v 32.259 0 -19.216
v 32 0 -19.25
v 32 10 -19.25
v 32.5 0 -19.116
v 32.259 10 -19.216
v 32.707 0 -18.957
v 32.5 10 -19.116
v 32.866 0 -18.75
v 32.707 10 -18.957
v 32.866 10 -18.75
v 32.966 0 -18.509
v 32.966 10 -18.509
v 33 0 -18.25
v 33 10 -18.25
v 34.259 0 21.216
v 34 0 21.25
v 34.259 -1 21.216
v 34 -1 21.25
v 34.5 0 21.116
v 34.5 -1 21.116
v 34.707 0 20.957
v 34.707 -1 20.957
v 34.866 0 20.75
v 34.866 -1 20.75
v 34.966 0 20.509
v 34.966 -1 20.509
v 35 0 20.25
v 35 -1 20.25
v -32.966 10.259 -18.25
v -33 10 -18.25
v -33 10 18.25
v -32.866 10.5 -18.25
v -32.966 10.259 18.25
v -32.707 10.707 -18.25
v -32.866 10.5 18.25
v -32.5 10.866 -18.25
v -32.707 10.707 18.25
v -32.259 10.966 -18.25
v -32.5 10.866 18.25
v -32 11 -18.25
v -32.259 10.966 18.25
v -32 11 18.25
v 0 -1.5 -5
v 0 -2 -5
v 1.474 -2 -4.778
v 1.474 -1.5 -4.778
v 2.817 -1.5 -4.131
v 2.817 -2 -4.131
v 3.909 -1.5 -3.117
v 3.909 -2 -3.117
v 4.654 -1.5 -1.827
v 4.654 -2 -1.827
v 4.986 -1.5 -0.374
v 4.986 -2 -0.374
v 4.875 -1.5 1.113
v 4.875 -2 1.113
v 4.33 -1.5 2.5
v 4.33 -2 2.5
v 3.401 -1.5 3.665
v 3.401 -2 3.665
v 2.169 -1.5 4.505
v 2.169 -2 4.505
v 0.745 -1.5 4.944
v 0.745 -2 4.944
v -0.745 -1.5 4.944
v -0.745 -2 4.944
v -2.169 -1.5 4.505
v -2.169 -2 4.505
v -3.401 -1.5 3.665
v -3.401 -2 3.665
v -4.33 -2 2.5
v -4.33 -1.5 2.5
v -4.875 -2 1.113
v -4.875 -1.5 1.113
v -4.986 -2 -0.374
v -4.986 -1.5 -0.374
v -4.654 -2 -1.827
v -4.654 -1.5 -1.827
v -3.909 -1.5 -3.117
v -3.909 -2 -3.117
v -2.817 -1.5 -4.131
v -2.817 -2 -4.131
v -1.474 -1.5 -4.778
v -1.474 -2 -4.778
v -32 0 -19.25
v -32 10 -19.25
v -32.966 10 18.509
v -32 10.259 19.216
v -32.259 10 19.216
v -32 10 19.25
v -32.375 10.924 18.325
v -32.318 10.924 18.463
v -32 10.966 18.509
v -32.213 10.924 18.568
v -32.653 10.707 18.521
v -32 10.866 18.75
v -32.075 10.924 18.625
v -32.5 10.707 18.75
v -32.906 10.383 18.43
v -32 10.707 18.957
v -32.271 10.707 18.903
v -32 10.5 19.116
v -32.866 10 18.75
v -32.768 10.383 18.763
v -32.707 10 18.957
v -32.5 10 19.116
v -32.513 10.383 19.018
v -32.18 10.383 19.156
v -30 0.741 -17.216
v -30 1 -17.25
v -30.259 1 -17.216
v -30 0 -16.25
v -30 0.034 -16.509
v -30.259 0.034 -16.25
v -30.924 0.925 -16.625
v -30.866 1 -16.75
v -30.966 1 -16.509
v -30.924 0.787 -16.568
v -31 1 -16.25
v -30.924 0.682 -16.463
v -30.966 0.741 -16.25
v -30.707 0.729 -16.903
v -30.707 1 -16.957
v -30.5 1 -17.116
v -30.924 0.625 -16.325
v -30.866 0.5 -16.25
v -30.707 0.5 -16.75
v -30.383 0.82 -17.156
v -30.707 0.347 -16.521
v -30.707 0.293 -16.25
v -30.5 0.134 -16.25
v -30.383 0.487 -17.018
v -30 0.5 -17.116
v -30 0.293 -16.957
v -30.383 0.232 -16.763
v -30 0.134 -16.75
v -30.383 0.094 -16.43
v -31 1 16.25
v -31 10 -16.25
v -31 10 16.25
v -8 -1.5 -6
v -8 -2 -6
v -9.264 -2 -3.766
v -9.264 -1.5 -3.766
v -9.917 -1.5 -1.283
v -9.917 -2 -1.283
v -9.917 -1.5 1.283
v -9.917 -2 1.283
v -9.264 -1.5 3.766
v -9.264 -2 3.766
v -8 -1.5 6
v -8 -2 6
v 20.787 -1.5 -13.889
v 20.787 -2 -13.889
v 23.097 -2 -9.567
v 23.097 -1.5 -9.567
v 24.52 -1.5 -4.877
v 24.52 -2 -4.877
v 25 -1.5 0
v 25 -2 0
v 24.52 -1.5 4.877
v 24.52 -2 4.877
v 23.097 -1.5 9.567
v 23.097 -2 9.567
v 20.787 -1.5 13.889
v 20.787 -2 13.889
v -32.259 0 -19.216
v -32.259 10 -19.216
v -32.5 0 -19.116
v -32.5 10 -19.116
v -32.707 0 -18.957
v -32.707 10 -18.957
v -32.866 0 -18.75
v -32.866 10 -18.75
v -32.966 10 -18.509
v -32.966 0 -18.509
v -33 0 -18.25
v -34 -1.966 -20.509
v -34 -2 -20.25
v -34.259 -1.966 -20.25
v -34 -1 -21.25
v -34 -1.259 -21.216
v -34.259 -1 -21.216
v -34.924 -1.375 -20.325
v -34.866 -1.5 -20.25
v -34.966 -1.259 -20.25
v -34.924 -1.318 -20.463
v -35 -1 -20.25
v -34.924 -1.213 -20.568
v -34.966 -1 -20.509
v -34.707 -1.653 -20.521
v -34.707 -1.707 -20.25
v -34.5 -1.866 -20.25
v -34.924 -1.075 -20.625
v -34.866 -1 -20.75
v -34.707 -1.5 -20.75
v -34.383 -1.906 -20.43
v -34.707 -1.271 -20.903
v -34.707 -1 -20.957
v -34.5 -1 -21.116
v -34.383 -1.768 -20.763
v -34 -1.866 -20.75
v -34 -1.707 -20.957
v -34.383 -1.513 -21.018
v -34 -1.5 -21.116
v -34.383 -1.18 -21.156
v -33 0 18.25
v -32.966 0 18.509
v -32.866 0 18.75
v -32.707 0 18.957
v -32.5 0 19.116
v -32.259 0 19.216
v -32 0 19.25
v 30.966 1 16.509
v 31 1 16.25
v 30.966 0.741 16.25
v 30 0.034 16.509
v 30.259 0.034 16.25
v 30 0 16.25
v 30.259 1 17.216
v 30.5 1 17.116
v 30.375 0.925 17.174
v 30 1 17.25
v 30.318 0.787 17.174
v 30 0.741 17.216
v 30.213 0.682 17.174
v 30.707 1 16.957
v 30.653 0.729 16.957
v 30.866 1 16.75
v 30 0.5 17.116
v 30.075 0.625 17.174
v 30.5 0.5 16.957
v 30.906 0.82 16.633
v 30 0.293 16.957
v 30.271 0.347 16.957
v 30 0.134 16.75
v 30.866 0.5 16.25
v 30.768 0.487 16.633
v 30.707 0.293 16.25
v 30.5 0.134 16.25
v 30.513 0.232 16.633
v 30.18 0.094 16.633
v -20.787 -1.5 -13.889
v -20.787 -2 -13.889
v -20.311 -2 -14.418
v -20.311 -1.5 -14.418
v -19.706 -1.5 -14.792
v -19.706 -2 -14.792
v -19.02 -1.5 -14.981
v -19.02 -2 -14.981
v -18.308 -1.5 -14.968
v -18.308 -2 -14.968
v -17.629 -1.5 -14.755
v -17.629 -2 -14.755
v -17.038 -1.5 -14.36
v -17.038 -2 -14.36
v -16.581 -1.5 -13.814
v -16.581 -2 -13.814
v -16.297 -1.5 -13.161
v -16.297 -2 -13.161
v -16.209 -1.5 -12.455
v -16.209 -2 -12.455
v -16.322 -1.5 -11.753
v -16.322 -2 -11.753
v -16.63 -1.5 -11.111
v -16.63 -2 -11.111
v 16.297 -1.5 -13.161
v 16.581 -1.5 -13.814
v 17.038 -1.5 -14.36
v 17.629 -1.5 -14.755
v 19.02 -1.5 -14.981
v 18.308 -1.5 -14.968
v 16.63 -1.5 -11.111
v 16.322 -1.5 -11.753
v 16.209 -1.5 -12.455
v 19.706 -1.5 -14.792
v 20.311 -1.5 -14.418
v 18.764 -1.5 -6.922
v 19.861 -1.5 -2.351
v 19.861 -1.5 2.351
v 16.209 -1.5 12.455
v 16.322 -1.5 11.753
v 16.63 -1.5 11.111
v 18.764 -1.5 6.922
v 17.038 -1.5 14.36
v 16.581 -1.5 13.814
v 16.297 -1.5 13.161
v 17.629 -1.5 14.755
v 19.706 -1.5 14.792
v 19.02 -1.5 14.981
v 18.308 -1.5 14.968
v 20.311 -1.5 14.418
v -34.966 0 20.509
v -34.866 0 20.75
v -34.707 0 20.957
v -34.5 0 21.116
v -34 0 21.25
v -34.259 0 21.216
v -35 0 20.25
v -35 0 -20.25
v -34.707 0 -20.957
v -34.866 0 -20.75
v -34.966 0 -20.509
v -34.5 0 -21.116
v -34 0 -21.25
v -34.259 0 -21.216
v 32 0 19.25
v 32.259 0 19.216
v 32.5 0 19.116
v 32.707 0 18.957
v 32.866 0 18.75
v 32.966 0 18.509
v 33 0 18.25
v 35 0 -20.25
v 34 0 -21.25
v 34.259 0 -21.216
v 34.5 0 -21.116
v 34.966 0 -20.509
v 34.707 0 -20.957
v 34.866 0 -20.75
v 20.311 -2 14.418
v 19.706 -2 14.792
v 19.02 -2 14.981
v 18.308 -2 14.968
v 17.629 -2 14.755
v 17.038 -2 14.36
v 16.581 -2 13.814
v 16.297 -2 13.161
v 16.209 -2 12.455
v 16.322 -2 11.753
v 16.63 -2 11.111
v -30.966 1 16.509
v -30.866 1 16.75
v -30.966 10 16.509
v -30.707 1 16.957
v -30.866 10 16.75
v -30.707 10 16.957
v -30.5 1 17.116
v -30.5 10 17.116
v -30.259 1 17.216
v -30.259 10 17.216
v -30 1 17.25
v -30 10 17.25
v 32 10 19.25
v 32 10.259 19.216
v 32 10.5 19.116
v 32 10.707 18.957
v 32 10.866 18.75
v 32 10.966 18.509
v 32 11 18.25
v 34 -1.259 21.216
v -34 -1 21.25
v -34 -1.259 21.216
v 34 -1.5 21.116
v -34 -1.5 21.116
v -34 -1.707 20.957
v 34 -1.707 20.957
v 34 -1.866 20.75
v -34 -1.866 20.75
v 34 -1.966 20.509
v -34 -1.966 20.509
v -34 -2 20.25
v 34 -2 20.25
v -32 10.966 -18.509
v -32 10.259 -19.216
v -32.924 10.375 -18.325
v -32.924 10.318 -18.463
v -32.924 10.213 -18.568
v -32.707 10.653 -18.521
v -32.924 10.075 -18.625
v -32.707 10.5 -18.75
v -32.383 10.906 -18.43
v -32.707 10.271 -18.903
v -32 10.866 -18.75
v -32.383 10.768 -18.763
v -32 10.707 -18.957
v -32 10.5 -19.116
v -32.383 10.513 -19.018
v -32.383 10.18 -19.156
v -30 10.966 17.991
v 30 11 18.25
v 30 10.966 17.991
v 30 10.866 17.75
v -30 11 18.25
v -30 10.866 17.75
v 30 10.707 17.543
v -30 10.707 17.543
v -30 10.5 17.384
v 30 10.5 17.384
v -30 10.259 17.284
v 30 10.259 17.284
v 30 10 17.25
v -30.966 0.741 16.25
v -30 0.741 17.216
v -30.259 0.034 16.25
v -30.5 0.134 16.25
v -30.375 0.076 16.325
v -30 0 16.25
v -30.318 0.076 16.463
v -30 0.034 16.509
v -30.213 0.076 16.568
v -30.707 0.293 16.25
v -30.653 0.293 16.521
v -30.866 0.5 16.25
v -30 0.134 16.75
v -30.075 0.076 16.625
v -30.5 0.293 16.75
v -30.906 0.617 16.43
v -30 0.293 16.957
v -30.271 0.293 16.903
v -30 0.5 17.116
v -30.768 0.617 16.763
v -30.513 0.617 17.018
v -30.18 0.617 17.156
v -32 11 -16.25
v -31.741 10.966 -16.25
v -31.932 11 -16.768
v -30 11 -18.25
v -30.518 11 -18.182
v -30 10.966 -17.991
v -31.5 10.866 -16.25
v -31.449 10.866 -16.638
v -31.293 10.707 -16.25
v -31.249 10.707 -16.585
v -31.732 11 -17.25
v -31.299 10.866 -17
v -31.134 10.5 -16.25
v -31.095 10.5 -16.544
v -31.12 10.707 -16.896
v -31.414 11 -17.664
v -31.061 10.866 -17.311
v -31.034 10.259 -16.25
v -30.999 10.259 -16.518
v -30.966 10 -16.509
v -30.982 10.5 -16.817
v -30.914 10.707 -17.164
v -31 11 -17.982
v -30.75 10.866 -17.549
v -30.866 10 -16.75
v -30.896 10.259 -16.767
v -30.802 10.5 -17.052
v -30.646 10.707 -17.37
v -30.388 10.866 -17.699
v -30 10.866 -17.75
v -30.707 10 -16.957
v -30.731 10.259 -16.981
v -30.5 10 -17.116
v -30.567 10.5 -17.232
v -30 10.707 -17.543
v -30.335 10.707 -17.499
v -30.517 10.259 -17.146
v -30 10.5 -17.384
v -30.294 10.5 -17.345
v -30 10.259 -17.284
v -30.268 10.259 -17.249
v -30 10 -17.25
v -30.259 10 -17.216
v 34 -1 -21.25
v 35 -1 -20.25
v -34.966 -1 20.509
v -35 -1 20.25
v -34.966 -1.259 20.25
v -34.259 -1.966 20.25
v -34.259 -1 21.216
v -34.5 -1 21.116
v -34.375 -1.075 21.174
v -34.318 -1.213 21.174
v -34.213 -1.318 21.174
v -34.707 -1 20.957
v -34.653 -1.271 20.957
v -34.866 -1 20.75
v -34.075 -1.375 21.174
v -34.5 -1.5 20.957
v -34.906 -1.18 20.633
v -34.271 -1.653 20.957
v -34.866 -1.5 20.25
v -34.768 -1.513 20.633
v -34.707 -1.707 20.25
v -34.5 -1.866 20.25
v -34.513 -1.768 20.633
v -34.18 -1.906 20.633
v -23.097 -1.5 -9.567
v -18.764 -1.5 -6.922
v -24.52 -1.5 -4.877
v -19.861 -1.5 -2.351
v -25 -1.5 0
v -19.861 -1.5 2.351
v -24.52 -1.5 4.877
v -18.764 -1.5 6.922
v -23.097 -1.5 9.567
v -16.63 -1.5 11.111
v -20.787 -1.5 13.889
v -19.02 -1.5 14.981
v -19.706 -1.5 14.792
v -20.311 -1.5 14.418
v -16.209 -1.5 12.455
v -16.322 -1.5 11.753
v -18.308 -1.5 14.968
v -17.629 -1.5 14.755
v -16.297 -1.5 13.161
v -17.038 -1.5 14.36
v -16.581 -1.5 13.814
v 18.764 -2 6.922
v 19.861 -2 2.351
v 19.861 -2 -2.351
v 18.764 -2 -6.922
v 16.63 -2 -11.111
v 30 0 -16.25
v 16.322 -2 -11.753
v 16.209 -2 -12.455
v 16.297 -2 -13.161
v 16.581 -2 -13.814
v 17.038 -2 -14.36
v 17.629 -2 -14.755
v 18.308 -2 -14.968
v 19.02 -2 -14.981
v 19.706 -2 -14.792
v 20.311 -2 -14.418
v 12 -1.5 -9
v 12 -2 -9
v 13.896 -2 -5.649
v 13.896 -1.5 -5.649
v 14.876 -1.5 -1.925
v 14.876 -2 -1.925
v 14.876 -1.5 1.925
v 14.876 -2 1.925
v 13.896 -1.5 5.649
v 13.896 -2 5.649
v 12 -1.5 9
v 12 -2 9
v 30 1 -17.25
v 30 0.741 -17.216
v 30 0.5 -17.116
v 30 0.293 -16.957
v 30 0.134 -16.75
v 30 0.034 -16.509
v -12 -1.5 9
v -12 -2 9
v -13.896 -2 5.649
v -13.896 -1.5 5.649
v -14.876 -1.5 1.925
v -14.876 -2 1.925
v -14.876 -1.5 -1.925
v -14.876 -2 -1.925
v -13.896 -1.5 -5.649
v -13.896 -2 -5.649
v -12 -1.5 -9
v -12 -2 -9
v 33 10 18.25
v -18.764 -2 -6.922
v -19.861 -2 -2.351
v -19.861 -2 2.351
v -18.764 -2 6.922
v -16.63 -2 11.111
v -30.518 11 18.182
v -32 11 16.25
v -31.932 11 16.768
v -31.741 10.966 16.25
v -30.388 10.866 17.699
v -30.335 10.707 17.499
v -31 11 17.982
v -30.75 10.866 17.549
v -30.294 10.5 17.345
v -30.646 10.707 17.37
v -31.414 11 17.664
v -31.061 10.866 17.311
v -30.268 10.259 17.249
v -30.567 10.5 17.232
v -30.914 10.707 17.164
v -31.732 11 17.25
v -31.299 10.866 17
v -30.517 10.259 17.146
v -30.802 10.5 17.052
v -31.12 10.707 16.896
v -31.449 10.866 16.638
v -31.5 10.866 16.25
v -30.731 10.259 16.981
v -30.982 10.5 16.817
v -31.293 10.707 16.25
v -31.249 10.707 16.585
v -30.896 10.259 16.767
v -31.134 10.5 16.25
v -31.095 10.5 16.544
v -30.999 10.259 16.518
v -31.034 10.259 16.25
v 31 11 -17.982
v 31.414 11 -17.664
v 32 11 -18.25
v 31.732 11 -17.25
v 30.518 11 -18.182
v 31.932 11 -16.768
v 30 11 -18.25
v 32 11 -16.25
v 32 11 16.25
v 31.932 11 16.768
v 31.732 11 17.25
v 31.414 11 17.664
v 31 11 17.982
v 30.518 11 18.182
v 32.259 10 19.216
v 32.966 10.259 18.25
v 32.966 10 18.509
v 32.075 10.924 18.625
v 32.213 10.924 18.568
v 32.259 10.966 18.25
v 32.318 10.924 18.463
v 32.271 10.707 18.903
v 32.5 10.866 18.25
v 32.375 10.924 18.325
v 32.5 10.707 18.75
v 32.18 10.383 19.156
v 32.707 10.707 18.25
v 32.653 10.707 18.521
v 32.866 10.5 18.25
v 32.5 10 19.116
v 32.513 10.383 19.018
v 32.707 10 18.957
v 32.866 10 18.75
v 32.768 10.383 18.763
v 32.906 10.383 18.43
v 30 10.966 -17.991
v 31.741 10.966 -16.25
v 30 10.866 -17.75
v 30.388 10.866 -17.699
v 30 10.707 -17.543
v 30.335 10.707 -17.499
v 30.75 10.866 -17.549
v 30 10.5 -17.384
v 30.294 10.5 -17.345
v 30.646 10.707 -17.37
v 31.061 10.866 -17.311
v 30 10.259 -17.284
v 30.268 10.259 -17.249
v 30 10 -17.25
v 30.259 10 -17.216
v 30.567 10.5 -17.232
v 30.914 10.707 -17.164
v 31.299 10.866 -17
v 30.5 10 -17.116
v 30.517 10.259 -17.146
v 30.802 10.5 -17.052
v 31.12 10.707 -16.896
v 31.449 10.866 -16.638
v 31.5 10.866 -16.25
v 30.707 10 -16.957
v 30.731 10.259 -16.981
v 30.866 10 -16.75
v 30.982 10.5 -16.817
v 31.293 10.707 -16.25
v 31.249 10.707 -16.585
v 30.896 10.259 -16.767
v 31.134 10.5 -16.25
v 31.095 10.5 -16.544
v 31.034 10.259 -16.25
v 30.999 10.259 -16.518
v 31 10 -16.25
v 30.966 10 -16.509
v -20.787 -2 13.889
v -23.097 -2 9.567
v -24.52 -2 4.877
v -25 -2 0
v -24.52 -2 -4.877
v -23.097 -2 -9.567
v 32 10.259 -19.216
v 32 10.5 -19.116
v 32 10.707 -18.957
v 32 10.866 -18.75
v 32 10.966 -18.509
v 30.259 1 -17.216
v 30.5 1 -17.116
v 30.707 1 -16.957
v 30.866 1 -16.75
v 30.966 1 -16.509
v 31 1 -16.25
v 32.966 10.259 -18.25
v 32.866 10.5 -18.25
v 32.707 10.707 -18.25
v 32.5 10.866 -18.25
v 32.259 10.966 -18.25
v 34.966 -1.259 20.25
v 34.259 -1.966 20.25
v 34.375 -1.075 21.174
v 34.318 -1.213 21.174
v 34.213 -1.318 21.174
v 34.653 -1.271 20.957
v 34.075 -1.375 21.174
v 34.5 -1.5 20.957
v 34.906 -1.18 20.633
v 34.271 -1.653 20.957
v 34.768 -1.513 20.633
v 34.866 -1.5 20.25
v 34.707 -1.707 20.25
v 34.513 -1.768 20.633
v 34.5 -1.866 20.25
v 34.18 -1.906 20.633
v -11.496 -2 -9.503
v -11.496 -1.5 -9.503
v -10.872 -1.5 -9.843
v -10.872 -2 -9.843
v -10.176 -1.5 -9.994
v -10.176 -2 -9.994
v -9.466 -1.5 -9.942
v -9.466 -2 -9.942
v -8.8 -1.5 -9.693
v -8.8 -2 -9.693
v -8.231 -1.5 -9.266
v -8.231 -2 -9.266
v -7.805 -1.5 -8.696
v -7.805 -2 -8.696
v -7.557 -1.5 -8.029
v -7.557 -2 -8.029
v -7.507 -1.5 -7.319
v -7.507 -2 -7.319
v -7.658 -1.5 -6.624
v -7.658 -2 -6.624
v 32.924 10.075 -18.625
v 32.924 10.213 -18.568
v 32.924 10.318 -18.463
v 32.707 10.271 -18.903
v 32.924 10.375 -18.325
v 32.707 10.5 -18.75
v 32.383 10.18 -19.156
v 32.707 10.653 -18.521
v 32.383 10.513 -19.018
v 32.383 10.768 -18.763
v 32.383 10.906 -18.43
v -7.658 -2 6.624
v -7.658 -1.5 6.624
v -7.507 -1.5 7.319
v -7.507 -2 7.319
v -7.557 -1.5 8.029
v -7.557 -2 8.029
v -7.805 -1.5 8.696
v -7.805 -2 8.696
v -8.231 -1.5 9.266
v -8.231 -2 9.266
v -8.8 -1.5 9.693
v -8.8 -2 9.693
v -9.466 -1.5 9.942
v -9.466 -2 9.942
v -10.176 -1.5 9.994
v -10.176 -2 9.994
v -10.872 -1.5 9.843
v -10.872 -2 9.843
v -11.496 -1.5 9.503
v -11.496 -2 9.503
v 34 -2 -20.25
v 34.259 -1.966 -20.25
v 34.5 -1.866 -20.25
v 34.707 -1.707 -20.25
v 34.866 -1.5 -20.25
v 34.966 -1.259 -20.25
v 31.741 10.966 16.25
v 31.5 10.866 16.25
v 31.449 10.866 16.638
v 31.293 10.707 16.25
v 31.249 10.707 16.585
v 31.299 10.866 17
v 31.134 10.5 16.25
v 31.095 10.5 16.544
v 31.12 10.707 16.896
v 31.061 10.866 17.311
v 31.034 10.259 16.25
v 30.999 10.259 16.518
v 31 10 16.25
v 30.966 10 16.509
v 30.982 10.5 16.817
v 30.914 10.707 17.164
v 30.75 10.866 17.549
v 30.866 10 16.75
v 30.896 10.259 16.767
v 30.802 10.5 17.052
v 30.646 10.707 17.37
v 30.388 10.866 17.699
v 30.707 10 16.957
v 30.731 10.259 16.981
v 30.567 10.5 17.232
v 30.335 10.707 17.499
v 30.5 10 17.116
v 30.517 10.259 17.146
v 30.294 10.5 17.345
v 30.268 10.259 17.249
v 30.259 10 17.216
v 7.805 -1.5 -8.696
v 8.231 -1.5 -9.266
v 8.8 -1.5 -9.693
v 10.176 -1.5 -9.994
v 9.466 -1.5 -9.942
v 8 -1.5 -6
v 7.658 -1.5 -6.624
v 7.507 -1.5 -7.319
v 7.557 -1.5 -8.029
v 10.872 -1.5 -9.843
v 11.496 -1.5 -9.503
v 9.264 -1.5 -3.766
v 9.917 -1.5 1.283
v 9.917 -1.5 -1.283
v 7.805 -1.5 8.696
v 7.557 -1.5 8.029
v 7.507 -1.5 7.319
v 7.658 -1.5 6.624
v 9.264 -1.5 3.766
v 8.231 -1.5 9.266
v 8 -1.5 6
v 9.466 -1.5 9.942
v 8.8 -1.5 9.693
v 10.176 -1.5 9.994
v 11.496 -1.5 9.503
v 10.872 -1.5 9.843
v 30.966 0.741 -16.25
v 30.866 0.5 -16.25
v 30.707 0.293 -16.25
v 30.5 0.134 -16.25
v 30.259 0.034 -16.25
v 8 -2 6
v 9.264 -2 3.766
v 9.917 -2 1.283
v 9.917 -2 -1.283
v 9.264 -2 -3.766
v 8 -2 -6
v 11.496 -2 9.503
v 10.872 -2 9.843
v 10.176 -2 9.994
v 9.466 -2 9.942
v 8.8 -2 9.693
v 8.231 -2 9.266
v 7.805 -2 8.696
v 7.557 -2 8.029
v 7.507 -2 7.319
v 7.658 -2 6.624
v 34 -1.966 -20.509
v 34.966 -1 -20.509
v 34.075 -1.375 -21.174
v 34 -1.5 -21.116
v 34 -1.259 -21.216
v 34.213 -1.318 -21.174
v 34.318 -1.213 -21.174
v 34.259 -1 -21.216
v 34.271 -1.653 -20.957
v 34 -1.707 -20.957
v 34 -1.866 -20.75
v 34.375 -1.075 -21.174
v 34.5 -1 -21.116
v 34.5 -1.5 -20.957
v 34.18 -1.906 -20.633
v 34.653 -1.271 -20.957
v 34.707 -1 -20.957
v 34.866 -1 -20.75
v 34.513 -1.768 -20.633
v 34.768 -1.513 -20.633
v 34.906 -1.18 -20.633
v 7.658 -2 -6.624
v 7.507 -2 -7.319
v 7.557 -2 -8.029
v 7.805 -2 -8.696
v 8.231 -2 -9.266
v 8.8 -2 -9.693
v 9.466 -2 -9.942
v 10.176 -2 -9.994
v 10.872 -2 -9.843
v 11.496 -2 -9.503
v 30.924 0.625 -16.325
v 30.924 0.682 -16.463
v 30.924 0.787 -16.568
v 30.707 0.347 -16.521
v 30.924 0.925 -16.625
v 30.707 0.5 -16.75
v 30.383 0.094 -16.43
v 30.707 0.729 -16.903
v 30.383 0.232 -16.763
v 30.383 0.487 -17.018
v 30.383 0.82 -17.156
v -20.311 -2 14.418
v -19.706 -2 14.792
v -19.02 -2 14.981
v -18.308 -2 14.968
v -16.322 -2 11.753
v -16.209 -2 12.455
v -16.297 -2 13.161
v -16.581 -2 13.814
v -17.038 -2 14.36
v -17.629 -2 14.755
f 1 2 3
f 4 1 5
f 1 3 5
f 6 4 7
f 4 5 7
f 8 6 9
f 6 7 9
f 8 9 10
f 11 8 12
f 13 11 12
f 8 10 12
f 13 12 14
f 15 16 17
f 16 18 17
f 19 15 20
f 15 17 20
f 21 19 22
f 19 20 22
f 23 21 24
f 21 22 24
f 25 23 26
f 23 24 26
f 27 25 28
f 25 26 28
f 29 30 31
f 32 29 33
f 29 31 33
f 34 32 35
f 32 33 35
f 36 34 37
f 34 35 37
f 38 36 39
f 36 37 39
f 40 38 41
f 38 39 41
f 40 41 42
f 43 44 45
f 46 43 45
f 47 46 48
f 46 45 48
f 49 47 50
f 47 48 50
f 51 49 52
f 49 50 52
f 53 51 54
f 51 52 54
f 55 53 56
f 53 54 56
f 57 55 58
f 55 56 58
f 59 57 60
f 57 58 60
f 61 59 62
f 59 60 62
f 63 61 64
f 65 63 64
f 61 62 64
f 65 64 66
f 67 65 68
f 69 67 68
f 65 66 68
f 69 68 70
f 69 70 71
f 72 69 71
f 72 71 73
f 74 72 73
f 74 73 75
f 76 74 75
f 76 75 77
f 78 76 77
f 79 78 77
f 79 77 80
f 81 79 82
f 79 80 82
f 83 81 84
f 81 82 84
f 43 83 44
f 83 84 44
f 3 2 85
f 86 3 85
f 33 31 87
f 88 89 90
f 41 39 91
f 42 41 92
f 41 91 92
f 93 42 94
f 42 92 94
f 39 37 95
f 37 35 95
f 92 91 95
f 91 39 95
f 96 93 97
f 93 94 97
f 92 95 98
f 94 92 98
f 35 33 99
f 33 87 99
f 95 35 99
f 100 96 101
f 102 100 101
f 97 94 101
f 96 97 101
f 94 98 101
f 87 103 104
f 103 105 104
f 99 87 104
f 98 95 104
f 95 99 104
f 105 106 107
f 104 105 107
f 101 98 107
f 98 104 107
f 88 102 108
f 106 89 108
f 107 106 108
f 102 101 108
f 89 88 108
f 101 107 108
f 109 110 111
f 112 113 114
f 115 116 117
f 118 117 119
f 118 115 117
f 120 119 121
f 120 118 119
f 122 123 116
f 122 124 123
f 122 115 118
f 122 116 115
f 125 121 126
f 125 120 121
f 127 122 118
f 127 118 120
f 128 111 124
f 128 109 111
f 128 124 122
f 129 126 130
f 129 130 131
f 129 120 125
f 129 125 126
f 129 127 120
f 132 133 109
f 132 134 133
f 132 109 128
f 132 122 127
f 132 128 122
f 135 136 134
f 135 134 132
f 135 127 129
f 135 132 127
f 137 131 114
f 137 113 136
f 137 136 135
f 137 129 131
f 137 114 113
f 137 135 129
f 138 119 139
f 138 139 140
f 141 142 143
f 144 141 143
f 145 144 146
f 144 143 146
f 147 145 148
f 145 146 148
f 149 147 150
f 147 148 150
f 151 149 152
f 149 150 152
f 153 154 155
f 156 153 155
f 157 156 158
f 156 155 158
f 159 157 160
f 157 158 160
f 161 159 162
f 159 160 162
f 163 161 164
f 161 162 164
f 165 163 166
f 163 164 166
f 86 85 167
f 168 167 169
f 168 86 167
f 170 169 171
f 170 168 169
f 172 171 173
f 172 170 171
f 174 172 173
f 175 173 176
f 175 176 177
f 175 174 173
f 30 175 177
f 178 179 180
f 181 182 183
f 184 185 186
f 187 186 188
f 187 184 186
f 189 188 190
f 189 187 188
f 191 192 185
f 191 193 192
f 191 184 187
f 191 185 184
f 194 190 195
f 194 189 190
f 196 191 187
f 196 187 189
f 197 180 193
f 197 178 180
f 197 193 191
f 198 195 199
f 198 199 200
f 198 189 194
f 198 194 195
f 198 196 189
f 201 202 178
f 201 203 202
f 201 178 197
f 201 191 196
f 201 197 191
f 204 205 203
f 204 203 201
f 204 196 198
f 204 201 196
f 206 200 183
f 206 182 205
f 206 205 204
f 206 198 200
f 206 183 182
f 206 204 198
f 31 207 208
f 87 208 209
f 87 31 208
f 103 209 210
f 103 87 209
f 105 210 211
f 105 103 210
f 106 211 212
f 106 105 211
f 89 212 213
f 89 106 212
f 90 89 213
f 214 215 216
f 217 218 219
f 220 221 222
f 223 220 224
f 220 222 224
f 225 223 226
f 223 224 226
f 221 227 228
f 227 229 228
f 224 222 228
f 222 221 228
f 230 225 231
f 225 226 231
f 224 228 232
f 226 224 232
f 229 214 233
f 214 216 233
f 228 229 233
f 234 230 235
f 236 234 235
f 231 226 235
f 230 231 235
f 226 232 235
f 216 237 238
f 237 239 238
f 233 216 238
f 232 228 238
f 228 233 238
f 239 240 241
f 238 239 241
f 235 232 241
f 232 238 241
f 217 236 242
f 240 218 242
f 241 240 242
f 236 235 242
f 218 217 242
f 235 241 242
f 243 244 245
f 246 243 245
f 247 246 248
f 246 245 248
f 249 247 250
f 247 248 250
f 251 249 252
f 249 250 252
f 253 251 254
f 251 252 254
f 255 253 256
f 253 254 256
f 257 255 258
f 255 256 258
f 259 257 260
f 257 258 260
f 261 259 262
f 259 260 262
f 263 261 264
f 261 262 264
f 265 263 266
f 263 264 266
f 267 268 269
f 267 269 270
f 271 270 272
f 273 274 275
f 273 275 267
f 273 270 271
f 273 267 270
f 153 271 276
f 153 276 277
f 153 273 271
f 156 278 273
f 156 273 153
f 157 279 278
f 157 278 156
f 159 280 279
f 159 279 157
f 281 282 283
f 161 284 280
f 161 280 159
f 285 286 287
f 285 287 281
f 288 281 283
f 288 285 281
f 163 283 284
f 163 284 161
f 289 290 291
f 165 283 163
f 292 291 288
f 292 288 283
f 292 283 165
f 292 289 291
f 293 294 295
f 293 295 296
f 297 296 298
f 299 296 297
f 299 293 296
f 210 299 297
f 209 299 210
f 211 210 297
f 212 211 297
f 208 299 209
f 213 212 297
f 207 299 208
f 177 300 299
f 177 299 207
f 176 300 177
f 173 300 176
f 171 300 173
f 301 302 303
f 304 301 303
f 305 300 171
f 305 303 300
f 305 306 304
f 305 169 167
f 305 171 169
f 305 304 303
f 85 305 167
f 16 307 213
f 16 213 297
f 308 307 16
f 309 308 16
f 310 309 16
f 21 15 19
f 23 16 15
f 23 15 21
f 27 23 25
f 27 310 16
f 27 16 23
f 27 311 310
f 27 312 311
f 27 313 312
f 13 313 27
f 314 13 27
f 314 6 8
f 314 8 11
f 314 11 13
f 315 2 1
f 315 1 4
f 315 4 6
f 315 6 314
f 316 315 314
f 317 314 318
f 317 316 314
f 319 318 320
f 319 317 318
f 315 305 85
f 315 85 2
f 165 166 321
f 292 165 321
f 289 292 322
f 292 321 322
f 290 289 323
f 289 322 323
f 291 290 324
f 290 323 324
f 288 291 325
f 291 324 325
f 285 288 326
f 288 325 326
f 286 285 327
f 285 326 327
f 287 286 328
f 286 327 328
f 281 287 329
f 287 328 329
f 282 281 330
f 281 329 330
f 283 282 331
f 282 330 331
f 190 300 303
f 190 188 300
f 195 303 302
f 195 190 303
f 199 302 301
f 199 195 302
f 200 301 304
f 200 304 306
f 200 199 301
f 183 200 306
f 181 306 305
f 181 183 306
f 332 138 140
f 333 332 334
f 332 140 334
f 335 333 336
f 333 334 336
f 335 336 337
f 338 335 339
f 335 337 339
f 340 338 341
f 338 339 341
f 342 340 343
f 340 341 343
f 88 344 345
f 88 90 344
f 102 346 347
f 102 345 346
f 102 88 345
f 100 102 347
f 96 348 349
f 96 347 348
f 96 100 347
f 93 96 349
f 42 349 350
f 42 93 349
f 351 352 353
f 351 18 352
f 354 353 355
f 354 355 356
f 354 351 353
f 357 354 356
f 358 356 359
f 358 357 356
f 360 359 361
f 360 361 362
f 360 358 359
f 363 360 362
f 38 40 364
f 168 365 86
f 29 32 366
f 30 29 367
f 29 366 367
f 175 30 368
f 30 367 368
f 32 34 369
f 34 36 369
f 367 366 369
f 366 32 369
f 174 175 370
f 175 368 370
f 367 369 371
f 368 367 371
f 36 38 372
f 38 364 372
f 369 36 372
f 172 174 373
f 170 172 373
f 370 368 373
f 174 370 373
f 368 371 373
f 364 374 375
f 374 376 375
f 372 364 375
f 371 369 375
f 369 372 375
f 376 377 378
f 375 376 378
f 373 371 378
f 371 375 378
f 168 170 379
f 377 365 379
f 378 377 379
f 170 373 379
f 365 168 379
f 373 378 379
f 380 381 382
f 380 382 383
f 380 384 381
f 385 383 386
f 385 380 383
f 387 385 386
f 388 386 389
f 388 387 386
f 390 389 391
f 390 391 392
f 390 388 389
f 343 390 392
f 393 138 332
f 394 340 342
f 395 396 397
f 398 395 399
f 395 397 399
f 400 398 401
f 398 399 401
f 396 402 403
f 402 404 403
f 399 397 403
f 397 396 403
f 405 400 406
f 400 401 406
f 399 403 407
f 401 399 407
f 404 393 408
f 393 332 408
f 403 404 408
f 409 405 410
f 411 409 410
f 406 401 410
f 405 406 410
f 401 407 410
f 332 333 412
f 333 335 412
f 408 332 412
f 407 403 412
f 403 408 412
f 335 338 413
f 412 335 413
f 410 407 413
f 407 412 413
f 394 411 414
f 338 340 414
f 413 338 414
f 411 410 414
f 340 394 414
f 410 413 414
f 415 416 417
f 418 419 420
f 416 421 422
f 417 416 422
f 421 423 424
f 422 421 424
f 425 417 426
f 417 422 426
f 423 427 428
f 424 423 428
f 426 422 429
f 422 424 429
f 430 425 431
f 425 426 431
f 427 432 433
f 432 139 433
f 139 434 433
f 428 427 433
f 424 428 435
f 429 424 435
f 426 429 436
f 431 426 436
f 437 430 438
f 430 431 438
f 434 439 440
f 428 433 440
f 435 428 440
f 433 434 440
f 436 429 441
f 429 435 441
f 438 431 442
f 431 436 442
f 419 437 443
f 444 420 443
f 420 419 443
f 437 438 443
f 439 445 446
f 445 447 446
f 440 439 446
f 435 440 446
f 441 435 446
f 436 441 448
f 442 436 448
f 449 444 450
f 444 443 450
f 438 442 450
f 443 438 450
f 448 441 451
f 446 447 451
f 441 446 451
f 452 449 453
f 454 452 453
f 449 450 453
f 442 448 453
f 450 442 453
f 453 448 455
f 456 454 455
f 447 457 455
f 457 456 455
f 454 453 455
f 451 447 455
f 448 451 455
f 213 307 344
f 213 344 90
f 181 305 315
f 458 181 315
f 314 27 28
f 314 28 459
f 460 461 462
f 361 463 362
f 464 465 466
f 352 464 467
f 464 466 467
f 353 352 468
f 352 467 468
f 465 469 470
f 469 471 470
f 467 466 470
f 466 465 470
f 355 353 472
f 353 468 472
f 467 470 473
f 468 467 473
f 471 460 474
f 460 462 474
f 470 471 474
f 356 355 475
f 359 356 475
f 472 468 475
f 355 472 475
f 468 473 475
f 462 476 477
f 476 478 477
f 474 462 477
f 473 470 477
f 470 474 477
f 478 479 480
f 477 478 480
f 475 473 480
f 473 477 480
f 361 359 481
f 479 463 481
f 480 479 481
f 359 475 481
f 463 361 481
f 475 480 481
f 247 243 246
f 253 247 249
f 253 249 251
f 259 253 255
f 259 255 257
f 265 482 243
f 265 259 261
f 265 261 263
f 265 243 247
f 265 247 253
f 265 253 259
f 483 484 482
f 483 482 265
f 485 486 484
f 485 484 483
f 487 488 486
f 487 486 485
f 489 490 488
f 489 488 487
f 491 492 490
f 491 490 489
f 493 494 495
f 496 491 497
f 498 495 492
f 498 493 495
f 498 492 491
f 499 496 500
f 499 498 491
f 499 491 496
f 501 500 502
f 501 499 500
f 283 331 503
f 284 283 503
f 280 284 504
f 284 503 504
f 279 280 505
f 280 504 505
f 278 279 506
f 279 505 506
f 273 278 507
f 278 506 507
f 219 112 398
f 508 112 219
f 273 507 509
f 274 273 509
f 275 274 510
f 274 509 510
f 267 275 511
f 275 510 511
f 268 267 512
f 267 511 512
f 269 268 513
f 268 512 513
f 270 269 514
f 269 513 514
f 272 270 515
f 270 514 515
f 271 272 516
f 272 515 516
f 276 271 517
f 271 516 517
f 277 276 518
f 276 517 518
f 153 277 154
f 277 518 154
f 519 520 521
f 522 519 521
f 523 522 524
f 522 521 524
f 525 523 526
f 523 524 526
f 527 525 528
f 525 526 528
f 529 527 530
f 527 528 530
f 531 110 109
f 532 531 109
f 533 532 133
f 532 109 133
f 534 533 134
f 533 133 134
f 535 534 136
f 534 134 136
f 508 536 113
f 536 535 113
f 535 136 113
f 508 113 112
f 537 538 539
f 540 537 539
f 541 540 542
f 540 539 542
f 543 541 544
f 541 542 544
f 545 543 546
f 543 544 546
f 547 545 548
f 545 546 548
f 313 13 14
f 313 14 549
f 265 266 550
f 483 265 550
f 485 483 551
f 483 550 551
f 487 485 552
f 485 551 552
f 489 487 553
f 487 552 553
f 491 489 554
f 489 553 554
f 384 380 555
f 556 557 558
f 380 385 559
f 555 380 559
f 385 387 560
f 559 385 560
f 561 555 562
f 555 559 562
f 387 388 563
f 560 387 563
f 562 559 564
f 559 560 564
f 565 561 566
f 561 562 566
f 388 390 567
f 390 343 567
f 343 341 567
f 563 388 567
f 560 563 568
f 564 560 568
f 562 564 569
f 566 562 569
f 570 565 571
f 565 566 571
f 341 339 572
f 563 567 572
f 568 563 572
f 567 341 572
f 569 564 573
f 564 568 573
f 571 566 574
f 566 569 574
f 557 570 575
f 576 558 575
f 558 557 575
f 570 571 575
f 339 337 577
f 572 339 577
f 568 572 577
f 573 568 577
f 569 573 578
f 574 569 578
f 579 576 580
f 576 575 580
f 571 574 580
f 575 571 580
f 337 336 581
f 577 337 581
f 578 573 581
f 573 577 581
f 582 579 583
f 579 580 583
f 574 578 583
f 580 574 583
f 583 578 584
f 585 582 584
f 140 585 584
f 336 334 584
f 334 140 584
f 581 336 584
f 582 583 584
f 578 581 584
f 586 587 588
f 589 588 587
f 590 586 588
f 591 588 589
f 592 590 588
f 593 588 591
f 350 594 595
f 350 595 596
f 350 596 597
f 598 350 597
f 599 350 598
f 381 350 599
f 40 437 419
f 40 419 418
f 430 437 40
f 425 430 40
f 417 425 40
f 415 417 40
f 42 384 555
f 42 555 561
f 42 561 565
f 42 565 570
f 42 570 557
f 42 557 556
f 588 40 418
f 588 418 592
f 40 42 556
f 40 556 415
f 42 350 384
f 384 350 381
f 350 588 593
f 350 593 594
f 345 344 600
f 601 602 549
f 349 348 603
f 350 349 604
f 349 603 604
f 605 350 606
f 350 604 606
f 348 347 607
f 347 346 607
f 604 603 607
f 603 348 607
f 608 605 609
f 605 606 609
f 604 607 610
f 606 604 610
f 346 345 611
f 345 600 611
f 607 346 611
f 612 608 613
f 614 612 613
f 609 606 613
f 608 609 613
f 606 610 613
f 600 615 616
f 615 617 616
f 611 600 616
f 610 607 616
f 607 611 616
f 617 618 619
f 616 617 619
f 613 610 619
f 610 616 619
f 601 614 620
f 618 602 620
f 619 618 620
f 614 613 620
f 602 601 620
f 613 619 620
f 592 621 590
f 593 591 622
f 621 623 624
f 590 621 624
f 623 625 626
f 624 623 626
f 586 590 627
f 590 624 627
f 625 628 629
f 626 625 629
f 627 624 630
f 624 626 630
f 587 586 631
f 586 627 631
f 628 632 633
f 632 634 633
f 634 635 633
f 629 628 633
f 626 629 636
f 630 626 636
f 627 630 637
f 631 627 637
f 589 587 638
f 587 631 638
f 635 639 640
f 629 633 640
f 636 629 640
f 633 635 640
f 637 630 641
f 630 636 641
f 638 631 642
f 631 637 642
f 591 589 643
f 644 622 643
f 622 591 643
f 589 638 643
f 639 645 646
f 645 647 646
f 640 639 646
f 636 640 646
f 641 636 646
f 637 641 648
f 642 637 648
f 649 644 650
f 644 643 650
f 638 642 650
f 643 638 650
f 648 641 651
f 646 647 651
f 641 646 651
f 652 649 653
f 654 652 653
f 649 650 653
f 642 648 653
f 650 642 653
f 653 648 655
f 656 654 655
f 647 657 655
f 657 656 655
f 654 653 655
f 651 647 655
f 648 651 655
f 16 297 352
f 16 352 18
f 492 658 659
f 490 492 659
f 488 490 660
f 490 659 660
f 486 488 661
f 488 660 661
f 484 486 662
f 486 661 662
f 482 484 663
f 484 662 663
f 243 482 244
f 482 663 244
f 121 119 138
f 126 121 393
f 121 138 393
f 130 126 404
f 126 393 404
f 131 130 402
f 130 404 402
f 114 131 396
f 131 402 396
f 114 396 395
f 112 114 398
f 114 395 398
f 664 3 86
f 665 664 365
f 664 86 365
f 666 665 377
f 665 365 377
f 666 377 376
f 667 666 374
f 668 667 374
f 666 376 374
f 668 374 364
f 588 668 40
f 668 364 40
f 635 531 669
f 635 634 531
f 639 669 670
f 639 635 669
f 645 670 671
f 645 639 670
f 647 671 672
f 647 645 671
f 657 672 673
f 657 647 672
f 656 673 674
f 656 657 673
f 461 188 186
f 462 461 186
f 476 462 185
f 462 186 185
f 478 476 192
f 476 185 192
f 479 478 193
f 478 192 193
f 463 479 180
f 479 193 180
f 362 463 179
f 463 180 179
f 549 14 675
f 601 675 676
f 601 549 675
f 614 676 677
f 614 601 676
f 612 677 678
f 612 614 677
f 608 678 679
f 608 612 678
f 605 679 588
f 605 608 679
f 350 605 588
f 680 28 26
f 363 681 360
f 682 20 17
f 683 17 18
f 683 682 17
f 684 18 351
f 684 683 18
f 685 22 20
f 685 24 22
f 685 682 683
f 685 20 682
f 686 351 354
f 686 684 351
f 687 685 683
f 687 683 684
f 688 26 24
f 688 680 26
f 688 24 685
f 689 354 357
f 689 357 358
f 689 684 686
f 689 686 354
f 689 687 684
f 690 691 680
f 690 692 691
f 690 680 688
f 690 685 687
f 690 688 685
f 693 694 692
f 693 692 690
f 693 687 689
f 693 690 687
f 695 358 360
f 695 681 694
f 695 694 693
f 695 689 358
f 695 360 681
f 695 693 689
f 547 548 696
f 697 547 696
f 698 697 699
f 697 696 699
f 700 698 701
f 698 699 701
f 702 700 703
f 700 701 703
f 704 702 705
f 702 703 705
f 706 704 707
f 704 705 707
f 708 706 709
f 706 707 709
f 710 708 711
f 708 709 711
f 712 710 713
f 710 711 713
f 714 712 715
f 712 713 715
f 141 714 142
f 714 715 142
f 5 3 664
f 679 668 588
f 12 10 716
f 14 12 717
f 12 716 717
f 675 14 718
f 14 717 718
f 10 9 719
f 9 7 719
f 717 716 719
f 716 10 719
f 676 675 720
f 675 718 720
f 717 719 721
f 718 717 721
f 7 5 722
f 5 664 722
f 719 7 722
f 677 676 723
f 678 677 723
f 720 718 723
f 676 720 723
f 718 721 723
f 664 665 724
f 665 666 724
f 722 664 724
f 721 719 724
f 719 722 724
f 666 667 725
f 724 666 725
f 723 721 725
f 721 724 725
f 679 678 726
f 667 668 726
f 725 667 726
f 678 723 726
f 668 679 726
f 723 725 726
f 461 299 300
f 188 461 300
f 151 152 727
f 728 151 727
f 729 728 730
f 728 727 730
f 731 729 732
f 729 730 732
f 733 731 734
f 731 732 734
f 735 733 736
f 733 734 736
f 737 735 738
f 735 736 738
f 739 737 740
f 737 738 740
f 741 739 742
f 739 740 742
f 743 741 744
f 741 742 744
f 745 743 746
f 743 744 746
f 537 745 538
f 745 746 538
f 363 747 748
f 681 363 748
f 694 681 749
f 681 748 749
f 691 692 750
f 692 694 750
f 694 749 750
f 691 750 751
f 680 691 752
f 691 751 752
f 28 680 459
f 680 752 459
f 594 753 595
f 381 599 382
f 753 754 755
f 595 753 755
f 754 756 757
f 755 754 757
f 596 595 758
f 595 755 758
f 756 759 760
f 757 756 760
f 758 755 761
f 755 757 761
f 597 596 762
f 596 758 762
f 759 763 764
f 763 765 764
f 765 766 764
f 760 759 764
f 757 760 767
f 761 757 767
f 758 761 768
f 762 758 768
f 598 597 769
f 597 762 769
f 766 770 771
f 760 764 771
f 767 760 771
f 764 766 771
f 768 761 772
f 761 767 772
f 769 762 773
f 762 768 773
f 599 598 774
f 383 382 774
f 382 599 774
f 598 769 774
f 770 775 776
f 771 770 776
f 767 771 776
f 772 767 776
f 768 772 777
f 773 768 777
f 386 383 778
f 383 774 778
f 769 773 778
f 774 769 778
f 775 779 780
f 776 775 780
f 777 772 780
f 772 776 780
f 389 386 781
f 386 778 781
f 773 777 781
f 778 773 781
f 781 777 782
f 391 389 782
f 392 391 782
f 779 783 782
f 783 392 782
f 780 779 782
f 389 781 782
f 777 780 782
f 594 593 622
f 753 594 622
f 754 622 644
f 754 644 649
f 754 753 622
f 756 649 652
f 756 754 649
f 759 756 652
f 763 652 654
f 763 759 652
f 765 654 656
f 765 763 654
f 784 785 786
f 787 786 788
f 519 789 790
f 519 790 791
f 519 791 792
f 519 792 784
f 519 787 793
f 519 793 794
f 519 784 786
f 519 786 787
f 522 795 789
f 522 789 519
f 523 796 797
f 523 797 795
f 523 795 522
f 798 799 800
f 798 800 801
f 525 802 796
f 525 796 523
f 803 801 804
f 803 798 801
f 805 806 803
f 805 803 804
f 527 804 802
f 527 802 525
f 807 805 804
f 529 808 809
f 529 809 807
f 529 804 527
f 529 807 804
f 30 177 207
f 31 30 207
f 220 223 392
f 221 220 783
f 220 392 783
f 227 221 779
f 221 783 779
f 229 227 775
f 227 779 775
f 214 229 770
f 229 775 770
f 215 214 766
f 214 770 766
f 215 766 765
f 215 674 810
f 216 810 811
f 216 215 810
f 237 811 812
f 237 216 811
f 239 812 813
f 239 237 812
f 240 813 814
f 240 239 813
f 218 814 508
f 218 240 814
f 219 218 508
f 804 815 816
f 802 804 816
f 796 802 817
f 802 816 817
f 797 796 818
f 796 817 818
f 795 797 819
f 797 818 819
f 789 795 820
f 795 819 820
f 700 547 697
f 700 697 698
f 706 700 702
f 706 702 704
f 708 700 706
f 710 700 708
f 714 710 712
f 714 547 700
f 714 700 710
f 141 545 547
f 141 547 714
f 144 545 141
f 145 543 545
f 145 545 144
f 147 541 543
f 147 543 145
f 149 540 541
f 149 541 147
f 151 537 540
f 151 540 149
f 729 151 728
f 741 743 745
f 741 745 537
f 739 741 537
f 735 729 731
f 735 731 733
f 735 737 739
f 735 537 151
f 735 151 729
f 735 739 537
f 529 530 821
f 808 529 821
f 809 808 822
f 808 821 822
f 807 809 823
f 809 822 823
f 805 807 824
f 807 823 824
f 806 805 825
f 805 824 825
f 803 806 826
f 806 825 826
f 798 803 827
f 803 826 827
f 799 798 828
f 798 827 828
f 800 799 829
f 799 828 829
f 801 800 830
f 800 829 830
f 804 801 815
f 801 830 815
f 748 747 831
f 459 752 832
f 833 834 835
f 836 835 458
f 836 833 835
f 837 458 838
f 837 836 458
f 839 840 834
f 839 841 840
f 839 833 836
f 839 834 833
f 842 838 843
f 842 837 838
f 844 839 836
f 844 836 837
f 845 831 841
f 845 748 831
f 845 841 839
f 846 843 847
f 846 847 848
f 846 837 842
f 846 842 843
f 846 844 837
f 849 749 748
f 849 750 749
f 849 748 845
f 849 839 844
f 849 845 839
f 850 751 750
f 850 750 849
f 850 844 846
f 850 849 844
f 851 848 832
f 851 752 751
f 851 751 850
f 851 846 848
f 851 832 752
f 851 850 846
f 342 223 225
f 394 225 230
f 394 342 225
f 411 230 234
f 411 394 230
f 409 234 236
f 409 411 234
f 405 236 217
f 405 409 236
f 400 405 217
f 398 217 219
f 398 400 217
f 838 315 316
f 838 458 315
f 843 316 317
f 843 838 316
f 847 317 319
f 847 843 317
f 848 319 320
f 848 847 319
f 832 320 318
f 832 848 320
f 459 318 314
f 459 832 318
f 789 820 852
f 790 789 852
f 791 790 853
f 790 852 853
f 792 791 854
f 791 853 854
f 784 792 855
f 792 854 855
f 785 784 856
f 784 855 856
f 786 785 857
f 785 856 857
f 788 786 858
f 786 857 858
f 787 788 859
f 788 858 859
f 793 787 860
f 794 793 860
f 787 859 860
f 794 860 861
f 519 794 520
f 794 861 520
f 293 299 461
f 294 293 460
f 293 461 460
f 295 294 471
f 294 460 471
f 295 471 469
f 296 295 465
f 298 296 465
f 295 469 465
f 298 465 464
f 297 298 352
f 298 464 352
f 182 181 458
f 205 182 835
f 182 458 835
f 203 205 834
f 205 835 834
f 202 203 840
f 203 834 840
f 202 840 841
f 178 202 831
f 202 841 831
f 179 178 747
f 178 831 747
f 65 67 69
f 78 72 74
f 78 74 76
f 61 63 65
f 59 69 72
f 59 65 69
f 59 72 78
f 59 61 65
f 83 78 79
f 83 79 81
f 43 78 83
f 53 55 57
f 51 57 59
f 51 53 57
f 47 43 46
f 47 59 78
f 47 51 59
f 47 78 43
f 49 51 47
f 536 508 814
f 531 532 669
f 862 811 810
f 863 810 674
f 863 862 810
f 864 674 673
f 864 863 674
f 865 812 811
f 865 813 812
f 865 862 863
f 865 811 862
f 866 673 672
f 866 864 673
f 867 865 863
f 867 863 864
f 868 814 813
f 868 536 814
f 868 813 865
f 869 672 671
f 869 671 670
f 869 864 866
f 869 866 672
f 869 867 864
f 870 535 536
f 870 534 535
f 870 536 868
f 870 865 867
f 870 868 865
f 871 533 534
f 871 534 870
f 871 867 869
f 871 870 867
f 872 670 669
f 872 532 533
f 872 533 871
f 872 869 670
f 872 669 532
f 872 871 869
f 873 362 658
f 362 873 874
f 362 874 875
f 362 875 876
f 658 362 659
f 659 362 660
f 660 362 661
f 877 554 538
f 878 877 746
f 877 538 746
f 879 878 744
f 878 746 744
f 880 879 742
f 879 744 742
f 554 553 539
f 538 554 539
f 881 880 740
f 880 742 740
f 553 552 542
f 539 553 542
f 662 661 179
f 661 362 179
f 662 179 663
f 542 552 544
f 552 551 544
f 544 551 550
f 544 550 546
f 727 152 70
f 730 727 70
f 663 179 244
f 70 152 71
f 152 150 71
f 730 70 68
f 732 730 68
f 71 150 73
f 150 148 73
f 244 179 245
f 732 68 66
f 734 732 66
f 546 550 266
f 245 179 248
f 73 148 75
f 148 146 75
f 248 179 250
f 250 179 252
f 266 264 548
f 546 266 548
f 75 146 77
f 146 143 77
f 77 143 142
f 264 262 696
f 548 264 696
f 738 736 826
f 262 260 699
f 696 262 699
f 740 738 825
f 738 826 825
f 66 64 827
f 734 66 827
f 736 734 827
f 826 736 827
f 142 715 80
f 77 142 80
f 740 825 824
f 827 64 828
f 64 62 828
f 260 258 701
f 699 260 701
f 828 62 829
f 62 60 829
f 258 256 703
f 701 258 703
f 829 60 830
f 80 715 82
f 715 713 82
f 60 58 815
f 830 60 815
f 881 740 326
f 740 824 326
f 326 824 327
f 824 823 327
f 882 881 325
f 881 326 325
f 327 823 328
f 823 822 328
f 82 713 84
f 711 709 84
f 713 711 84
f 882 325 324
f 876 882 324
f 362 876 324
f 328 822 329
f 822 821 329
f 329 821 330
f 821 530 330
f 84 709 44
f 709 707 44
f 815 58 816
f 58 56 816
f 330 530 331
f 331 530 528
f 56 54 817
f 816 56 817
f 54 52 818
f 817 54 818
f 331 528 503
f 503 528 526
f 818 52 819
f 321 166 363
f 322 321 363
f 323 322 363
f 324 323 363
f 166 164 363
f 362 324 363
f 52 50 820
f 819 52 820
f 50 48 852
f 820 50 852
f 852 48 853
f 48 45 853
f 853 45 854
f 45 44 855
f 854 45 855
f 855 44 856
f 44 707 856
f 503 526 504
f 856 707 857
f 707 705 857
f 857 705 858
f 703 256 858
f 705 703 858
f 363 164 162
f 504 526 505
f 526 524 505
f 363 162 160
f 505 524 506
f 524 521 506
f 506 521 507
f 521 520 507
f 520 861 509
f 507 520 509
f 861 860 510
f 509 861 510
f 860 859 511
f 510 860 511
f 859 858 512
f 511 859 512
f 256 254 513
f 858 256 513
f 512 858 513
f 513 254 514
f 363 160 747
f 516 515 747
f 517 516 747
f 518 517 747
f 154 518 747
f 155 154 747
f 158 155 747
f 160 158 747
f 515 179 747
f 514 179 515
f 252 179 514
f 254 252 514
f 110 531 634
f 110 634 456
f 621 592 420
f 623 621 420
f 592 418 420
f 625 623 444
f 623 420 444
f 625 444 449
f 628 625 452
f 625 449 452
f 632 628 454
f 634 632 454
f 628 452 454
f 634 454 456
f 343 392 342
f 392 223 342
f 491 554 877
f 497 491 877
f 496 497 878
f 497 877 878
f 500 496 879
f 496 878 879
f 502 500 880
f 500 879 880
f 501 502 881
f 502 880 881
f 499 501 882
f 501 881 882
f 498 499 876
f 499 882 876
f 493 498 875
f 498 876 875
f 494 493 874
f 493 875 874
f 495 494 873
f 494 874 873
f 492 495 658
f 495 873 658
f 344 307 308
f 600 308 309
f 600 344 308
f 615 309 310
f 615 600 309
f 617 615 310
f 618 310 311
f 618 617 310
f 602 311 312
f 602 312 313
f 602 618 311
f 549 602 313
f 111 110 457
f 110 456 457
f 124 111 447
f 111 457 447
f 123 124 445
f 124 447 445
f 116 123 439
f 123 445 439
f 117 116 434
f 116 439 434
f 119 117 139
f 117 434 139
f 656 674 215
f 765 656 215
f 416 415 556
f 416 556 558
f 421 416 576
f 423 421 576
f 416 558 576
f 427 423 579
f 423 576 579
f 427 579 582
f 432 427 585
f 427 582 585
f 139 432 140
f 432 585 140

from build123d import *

# Parameters (mm, degrees)
SKETCH1_W           = 70
SKETCH1_H           = 42.5
BOSS_EXTRUDE1_DEPTH = 2
SKETCH2_W           = 66
SKETCH2_H           = 38.5
SKETCH2_W_2         = 62
SKETCH2_H_2         = 34.5
BOSS_EXTRUDE2_DEPTH = 11
FILLET1_R           = 1
SKETCH3_R           = 5
CUT_EXTRUDE1_DEPTH  = 0.5


with BuildPart() as part:
    # Sketch1 → Boss-Extrude1 (new body)
    with BuildSketch(Plane(origin=(0, 0, 0), x_dir=(1, 0, 0), z_dir=(0, 1, 0))):
        Rectangle(SKETCH1_W, SKETCH1_H)
    extrude(amount=-BOSS_EXTRUDE1_DEPTH)

    # Sketch2 → Boss-Extrude2 (add)
    with BuildSketch(Plane(origin=(0, 0, 0), x_dir=(-1, 0, 0), z_dir=(0, 1, 0))):
        Rectangle(SKETCH2_W, SKETCH2_H)
        Rectangle(SKETCH2_W_2, SKETCH2_H_2, mode=Mode.SUBTRACT)
    extrude(amount=BOSS_EXTRUDE2_DEPTH)

    # Fillet1
    fillet1_edges = [part.edges().sort_by_distance(p)[0] for p in [
        (35, -2, 0),
        (0, -2, -21.25),
        (0, 0, -17.25),
        (-31, 5.5, -17.25),
        (31, 0, 0),
        (31, 5.5, -17.25),
        (0, 11, 17.25),
        (31, 5.5, 17.25),
        (-33, 5.5, 19.25),
        (33, 5.5, 19.25),
        (0, 11, -19.25),
        (33, 5.5, -19.25),
        (-33, 11, 0),
        (-33, 5.5, -19.25),
        (-31, 11, 0),
        (-31, 5.5, 17.25),
        (0, 11, 19.25),
        (33, 11, 0),
        (0, 11, -17.25),
        (31, 11, 0),
        (-31, 0, 0),
        (0, 0, 17.25),
        (-35, -2, 0),
        (-35, -1, -21.25),
        (35, -1, -21.25),
        (35, -1, 21.25),
        (-35, -1, 21.25),
        (0, -2, 21.25),
    ]]
    fillet(fillet1_edges, radius=FILLET1_R - 0.0001)  # a hair under: the kernel refuses the full size

    # Sketch3 → Cut-Extrude1 (cut)
    with BuildSketch(Plane.XZ.offset(2)):
        with BuildLine():
            ThreePointArc((12.000000021, 8.999999972), (8.499999983, 9.499999987), (8.000000047, 5.999999937))
            ThreePointArc((8.000000047, 5.999999937), (10, -3.8e-08), (8.000000001, -5.999999998))
            ThreePointArc((8.000000001, -5.999999998), (8.499999982, -9.499999987), (11.999999975, -9.000000033))
            ThreePointArc((11.999999975, -9.000000033), (15, -3.8e-08), (12.000000021, 8.999999972))
        make_face()
        with Locations(Location((0, 0, 0), (0, 0, 270))):
            Circle(SKETCH3_R)
        with BuildLine():
            ThreePointArc((-8.000000081, -5.999999892), (-10, -1.9e-08), (-8.000000104, 5.999999861))
            ThreePointArc((-8.000000104, 5.999999861), (-8.499999944, 9.499999958), (-12.000000021, 8.999999972))
            ThreePointArc((-12.000000021, 8.999999972), (-15, 3.8e-08), (-12.000000067, -8.999999911))
            ThreePointArc((-12.000000067, -8.999999911), (-8.49999999, -9.499999993), (-8.000000081, -5.999999892))
        make_face()
        with BuildLine():
            ThreePointArc((16.62958836, 11.111111149), (20, -3.3e-08), (16.629588323, -11.111111204))
            ThreePointArc((16.629588323, -11.111111204), (17.319398074, -14.578698568), (20.786985459, -13.888888924))
            ThreePointArc((20.786985459, -13.888888924), (25, -2.4e-08), (20.786985486, 13.888888883))
            ThreePointArc((20.786985486, 13.888888883), (17.319398067, 14.578698563), (16.62958836, 11.111111149))
        make_face()
        with BuildLine():
            ThreePointArc((-16.629588323, -11.111111204), (-20, 2.3e-08), (-16.629588298, 11.111111242))
            ThreePointArc((-16.629588298, 11.111111242), (-17.319398098, 14.578698584), (-20.786985465, 13.888888914))
            ThreePointArc((-20.786985465, 13.888888914), (-25, -1.1e-08), (-20.786985453, -13.888888933))
            ThreePointArc((-20.786985453, -13.888888933), (-17.31939807, -14.578698565), (-16.629588323, -11.111111204))
        make_face()
    extrude(amount=-CUT_EXTRUDE1_DEPTH, mode=Mode.SUBTRACT)


solid = part.part
